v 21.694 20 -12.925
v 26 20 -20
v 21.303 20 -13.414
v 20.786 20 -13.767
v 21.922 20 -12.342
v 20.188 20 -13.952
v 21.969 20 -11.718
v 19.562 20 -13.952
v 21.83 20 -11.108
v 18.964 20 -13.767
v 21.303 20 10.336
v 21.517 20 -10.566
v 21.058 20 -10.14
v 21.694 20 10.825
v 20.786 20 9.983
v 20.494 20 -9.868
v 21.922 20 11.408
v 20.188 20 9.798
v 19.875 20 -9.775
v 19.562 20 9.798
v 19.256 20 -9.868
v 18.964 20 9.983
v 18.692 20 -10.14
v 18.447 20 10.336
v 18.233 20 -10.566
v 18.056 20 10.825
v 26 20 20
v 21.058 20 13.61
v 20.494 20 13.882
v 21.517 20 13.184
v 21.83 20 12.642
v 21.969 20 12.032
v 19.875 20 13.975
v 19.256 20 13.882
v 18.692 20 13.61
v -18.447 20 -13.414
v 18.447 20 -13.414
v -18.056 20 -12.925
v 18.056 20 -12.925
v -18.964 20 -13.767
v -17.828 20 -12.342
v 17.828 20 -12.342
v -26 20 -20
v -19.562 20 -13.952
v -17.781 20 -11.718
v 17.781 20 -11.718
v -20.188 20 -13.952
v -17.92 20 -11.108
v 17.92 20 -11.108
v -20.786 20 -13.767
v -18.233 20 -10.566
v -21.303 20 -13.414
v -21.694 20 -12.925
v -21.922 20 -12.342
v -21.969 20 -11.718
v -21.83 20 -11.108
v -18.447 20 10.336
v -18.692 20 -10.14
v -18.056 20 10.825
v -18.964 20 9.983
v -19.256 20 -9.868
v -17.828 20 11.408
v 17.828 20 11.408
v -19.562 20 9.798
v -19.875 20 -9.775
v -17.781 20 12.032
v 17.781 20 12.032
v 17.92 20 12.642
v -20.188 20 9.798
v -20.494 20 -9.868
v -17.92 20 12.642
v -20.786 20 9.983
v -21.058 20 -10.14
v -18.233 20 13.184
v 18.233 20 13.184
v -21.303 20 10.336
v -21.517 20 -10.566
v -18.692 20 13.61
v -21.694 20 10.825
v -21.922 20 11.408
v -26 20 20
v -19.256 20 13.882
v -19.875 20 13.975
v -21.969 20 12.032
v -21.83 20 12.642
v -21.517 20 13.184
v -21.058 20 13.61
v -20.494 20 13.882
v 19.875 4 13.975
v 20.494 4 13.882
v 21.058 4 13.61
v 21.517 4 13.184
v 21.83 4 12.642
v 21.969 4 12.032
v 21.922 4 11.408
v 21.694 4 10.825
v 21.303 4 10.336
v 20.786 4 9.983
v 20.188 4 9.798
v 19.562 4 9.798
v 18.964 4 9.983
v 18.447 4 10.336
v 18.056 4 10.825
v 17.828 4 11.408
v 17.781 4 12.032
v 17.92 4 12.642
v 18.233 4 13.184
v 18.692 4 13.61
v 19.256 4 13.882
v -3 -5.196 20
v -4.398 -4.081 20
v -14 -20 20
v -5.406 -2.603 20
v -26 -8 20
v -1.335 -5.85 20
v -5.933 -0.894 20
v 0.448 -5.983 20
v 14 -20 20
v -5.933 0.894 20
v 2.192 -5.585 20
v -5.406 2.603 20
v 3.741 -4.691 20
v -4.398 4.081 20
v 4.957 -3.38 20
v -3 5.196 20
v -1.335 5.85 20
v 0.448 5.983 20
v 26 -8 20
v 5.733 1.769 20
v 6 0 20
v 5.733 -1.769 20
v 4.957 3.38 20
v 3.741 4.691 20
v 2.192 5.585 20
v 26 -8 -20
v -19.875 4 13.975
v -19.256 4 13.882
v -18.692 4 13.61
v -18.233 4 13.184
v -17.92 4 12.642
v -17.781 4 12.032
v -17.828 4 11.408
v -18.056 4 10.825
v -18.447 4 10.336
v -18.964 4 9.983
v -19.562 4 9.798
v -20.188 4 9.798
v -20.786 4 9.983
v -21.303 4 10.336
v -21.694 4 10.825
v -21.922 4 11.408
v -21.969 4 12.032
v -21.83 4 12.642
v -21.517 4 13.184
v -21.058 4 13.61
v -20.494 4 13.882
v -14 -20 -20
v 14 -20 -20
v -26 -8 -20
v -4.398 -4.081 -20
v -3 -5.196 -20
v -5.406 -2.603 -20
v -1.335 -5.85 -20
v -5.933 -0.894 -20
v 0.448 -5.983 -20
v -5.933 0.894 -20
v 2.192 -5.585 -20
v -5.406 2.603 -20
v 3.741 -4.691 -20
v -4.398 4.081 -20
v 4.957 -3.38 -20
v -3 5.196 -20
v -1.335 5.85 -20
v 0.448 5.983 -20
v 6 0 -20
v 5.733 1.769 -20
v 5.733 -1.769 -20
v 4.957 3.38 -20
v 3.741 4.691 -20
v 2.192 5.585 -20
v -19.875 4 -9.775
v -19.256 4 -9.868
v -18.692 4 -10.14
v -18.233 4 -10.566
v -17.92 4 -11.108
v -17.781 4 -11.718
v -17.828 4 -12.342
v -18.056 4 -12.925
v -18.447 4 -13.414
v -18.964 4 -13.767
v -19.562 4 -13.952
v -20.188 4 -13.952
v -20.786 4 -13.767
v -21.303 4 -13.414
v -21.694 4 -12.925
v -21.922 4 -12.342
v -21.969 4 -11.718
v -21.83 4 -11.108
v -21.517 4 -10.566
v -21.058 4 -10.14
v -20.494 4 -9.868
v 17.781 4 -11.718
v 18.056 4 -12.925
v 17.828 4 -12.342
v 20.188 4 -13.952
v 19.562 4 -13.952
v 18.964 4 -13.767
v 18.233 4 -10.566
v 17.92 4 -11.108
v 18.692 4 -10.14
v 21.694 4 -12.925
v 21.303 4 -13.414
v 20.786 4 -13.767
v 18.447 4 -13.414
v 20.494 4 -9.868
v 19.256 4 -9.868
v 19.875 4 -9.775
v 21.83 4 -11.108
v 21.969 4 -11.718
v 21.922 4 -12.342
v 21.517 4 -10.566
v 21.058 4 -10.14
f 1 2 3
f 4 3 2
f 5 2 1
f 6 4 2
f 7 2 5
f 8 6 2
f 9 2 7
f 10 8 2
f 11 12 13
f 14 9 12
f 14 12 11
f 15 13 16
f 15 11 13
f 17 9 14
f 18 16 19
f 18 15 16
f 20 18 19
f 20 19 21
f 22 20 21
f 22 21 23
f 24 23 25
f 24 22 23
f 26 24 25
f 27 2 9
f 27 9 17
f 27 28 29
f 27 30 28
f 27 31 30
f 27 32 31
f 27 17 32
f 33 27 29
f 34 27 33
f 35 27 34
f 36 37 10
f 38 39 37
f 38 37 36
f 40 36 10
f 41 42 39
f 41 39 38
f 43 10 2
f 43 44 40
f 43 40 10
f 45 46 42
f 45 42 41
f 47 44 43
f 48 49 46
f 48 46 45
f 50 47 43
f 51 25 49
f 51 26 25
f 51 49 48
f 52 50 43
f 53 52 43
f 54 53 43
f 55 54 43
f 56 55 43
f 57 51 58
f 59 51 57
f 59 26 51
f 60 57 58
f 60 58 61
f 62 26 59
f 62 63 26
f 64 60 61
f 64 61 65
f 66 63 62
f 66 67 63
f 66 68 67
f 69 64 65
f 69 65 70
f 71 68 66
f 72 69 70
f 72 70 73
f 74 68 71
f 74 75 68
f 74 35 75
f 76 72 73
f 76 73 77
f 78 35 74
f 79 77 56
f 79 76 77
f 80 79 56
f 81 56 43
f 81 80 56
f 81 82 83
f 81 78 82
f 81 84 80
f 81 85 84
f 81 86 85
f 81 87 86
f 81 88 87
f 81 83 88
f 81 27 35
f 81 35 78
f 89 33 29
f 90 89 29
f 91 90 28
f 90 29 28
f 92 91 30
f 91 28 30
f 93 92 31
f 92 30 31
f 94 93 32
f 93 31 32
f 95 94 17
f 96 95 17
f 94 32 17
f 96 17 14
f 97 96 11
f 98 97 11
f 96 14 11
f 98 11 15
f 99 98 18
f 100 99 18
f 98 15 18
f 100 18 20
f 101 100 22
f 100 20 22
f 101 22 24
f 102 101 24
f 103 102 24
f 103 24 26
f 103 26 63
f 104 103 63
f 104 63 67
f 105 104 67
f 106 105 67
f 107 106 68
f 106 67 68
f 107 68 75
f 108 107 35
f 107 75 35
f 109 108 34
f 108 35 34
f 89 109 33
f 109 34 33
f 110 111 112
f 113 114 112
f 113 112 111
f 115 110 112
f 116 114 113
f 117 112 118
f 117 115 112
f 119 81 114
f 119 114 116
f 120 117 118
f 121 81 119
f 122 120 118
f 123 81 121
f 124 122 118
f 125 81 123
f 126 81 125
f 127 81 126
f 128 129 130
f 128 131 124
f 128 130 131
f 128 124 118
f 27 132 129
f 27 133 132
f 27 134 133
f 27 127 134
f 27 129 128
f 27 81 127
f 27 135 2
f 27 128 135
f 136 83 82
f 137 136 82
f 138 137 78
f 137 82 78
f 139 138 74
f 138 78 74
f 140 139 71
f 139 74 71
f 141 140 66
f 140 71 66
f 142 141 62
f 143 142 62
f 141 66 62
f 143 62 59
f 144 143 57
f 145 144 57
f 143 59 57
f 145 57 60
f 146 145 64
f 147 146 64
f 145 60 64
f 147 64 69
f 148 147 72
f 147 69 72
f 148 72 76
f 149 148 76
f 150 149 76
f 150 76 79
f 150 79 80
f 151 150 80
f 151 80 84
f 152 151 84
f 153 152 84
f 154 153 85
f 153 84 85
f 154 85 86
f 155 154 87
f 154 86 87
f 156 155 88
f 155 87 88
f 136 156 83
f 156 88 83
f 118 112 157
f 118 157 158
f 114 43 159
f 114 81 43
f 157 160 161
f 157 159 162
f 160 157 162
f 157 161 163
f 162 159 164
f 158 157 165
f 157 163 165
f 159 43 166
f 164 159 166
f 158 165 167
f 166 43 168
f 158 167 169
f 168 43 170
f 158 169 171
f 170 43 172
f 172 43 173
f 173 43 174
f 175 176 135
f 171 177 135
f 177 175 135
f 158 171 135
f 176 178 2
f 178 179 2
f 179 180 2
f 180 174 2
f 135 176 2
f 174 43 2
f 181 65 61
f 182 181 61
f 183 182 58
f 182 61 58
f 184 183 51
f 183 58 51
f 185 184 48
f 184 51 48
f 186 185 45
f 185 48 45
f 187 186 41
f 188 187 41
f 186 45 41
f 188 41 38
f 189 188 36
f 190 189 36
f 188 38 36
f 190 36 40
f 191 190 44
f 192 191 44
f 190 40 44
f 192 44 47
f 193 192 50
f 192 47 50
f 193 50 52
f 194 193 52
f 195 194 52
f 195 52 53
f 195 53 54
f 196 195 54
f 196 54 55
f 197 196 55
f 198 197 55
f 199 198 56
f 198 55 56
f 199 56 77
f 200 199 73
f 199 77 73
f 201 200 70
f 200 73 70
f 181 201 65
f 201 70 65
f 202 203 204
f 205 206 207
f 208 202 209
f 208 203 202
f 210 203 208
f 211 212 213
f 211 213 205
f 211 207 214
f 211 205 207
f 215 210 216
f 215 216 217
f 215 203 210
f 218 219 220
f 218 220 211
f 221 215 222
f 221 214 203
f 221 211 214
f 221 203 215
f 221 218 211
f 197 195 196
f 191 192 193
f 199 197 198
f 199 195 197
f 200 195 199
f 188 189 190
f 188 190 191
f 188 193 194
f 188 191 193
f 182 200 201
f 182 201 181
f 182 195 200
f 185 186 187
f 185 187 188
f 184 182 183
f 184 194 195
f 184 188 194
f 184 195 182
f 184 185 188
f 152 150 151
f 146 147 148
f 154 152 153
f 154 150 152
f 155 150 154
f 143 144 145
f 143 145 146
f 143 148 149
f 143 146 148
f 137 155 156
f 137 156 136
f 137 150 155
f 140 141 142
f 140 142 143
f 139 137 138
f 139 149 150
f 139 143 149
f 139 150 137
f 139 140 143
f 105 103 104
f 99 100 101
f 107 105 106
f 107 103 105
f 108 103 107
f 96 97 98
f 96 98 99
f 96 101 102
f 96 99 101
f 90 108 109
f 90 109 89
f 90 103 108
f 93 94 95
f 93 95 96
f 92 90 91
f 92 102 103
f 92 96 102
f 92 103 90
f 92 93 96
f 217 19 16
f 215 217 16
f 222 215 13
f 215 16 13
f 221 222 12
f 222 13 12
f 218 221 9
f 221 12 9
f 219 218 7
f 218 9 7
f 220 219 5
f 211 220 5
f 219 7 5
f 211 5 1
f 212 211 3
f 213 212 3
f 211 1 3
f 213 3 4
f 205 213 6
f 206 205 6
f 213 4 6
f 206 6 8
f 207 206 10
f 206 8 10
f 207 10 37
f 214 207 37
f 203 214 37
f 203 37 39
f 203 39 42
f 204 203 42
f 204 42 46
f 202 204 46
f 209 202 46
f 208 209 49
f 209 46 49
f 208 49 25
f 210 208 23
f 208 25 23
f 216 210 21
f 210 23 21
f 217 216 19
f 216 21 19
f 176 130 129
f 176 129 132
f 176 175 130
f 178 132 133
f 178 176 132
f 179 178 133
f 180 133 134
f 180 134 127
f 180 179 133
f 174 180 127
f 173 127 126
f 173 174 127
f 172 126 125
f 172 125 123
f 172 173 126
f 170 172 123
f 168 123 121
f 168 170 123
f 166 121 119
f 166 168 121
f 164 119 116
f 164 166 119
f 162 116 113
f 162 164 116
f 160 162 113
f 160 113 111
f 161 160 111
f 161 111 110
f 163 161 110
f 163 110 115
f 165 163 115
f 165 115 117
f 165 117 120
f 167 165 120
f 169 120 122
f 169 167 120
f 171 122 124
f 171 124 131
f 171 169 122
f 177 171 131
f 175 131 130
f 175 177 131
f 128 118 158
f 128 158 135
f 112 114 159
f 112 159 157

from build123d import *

# Parameters (mm, degrees)
SKETCH1_R           = 6
BOSS_EXTRUDE1_DEPTH = 20
SKETCH2_R           = 2.1
CUT_EXTRUDE1_DEPTH  = 16


with BuildPart() as part:
    # Sketch1 → Boss-Extrude1 (new, symmetric)
    with BuildSketch(Plane.XY):
        Polygon((-26, 20), (-26, -8), (-14, -20), (14, -20), (26, -8), (26, 20), align=None)
        Circle(SKETCH1_R, mode=Mode.SUBTRACT)
    extrude(amount=BOSS_EXTRUDE1_DEPTH, both=True)

    # Sketch2 → Cut-Extrude1 (cut)
    with BuildSketch(Plane(origin=(0, 20, 0), x_dir=(1, 0, 0), z_dir=(0, 1, 0))):
        with Locations(Location((-19.875, 11.875, 0), (0, 0, 270))):
            Circle(SKETCH2_R)
        with Locations(Location((19.875, 11.875, 0), (0, 0, 270))):
            Circle(SKETCH2_R)
        with Locations(Location((19.875, -11.875, 0), (0, 0, 270))):
            Circle(SKETCH2_R)
        with Locations(Location((-19.875, -11.875, 0), (0, 0, 270))):
            Circle(SKETCH2_R)
    extrude(amount=-CUT_EXTRUDE1_DEPTH, mode=Mode.SUBTRACT)


solid = part.part
